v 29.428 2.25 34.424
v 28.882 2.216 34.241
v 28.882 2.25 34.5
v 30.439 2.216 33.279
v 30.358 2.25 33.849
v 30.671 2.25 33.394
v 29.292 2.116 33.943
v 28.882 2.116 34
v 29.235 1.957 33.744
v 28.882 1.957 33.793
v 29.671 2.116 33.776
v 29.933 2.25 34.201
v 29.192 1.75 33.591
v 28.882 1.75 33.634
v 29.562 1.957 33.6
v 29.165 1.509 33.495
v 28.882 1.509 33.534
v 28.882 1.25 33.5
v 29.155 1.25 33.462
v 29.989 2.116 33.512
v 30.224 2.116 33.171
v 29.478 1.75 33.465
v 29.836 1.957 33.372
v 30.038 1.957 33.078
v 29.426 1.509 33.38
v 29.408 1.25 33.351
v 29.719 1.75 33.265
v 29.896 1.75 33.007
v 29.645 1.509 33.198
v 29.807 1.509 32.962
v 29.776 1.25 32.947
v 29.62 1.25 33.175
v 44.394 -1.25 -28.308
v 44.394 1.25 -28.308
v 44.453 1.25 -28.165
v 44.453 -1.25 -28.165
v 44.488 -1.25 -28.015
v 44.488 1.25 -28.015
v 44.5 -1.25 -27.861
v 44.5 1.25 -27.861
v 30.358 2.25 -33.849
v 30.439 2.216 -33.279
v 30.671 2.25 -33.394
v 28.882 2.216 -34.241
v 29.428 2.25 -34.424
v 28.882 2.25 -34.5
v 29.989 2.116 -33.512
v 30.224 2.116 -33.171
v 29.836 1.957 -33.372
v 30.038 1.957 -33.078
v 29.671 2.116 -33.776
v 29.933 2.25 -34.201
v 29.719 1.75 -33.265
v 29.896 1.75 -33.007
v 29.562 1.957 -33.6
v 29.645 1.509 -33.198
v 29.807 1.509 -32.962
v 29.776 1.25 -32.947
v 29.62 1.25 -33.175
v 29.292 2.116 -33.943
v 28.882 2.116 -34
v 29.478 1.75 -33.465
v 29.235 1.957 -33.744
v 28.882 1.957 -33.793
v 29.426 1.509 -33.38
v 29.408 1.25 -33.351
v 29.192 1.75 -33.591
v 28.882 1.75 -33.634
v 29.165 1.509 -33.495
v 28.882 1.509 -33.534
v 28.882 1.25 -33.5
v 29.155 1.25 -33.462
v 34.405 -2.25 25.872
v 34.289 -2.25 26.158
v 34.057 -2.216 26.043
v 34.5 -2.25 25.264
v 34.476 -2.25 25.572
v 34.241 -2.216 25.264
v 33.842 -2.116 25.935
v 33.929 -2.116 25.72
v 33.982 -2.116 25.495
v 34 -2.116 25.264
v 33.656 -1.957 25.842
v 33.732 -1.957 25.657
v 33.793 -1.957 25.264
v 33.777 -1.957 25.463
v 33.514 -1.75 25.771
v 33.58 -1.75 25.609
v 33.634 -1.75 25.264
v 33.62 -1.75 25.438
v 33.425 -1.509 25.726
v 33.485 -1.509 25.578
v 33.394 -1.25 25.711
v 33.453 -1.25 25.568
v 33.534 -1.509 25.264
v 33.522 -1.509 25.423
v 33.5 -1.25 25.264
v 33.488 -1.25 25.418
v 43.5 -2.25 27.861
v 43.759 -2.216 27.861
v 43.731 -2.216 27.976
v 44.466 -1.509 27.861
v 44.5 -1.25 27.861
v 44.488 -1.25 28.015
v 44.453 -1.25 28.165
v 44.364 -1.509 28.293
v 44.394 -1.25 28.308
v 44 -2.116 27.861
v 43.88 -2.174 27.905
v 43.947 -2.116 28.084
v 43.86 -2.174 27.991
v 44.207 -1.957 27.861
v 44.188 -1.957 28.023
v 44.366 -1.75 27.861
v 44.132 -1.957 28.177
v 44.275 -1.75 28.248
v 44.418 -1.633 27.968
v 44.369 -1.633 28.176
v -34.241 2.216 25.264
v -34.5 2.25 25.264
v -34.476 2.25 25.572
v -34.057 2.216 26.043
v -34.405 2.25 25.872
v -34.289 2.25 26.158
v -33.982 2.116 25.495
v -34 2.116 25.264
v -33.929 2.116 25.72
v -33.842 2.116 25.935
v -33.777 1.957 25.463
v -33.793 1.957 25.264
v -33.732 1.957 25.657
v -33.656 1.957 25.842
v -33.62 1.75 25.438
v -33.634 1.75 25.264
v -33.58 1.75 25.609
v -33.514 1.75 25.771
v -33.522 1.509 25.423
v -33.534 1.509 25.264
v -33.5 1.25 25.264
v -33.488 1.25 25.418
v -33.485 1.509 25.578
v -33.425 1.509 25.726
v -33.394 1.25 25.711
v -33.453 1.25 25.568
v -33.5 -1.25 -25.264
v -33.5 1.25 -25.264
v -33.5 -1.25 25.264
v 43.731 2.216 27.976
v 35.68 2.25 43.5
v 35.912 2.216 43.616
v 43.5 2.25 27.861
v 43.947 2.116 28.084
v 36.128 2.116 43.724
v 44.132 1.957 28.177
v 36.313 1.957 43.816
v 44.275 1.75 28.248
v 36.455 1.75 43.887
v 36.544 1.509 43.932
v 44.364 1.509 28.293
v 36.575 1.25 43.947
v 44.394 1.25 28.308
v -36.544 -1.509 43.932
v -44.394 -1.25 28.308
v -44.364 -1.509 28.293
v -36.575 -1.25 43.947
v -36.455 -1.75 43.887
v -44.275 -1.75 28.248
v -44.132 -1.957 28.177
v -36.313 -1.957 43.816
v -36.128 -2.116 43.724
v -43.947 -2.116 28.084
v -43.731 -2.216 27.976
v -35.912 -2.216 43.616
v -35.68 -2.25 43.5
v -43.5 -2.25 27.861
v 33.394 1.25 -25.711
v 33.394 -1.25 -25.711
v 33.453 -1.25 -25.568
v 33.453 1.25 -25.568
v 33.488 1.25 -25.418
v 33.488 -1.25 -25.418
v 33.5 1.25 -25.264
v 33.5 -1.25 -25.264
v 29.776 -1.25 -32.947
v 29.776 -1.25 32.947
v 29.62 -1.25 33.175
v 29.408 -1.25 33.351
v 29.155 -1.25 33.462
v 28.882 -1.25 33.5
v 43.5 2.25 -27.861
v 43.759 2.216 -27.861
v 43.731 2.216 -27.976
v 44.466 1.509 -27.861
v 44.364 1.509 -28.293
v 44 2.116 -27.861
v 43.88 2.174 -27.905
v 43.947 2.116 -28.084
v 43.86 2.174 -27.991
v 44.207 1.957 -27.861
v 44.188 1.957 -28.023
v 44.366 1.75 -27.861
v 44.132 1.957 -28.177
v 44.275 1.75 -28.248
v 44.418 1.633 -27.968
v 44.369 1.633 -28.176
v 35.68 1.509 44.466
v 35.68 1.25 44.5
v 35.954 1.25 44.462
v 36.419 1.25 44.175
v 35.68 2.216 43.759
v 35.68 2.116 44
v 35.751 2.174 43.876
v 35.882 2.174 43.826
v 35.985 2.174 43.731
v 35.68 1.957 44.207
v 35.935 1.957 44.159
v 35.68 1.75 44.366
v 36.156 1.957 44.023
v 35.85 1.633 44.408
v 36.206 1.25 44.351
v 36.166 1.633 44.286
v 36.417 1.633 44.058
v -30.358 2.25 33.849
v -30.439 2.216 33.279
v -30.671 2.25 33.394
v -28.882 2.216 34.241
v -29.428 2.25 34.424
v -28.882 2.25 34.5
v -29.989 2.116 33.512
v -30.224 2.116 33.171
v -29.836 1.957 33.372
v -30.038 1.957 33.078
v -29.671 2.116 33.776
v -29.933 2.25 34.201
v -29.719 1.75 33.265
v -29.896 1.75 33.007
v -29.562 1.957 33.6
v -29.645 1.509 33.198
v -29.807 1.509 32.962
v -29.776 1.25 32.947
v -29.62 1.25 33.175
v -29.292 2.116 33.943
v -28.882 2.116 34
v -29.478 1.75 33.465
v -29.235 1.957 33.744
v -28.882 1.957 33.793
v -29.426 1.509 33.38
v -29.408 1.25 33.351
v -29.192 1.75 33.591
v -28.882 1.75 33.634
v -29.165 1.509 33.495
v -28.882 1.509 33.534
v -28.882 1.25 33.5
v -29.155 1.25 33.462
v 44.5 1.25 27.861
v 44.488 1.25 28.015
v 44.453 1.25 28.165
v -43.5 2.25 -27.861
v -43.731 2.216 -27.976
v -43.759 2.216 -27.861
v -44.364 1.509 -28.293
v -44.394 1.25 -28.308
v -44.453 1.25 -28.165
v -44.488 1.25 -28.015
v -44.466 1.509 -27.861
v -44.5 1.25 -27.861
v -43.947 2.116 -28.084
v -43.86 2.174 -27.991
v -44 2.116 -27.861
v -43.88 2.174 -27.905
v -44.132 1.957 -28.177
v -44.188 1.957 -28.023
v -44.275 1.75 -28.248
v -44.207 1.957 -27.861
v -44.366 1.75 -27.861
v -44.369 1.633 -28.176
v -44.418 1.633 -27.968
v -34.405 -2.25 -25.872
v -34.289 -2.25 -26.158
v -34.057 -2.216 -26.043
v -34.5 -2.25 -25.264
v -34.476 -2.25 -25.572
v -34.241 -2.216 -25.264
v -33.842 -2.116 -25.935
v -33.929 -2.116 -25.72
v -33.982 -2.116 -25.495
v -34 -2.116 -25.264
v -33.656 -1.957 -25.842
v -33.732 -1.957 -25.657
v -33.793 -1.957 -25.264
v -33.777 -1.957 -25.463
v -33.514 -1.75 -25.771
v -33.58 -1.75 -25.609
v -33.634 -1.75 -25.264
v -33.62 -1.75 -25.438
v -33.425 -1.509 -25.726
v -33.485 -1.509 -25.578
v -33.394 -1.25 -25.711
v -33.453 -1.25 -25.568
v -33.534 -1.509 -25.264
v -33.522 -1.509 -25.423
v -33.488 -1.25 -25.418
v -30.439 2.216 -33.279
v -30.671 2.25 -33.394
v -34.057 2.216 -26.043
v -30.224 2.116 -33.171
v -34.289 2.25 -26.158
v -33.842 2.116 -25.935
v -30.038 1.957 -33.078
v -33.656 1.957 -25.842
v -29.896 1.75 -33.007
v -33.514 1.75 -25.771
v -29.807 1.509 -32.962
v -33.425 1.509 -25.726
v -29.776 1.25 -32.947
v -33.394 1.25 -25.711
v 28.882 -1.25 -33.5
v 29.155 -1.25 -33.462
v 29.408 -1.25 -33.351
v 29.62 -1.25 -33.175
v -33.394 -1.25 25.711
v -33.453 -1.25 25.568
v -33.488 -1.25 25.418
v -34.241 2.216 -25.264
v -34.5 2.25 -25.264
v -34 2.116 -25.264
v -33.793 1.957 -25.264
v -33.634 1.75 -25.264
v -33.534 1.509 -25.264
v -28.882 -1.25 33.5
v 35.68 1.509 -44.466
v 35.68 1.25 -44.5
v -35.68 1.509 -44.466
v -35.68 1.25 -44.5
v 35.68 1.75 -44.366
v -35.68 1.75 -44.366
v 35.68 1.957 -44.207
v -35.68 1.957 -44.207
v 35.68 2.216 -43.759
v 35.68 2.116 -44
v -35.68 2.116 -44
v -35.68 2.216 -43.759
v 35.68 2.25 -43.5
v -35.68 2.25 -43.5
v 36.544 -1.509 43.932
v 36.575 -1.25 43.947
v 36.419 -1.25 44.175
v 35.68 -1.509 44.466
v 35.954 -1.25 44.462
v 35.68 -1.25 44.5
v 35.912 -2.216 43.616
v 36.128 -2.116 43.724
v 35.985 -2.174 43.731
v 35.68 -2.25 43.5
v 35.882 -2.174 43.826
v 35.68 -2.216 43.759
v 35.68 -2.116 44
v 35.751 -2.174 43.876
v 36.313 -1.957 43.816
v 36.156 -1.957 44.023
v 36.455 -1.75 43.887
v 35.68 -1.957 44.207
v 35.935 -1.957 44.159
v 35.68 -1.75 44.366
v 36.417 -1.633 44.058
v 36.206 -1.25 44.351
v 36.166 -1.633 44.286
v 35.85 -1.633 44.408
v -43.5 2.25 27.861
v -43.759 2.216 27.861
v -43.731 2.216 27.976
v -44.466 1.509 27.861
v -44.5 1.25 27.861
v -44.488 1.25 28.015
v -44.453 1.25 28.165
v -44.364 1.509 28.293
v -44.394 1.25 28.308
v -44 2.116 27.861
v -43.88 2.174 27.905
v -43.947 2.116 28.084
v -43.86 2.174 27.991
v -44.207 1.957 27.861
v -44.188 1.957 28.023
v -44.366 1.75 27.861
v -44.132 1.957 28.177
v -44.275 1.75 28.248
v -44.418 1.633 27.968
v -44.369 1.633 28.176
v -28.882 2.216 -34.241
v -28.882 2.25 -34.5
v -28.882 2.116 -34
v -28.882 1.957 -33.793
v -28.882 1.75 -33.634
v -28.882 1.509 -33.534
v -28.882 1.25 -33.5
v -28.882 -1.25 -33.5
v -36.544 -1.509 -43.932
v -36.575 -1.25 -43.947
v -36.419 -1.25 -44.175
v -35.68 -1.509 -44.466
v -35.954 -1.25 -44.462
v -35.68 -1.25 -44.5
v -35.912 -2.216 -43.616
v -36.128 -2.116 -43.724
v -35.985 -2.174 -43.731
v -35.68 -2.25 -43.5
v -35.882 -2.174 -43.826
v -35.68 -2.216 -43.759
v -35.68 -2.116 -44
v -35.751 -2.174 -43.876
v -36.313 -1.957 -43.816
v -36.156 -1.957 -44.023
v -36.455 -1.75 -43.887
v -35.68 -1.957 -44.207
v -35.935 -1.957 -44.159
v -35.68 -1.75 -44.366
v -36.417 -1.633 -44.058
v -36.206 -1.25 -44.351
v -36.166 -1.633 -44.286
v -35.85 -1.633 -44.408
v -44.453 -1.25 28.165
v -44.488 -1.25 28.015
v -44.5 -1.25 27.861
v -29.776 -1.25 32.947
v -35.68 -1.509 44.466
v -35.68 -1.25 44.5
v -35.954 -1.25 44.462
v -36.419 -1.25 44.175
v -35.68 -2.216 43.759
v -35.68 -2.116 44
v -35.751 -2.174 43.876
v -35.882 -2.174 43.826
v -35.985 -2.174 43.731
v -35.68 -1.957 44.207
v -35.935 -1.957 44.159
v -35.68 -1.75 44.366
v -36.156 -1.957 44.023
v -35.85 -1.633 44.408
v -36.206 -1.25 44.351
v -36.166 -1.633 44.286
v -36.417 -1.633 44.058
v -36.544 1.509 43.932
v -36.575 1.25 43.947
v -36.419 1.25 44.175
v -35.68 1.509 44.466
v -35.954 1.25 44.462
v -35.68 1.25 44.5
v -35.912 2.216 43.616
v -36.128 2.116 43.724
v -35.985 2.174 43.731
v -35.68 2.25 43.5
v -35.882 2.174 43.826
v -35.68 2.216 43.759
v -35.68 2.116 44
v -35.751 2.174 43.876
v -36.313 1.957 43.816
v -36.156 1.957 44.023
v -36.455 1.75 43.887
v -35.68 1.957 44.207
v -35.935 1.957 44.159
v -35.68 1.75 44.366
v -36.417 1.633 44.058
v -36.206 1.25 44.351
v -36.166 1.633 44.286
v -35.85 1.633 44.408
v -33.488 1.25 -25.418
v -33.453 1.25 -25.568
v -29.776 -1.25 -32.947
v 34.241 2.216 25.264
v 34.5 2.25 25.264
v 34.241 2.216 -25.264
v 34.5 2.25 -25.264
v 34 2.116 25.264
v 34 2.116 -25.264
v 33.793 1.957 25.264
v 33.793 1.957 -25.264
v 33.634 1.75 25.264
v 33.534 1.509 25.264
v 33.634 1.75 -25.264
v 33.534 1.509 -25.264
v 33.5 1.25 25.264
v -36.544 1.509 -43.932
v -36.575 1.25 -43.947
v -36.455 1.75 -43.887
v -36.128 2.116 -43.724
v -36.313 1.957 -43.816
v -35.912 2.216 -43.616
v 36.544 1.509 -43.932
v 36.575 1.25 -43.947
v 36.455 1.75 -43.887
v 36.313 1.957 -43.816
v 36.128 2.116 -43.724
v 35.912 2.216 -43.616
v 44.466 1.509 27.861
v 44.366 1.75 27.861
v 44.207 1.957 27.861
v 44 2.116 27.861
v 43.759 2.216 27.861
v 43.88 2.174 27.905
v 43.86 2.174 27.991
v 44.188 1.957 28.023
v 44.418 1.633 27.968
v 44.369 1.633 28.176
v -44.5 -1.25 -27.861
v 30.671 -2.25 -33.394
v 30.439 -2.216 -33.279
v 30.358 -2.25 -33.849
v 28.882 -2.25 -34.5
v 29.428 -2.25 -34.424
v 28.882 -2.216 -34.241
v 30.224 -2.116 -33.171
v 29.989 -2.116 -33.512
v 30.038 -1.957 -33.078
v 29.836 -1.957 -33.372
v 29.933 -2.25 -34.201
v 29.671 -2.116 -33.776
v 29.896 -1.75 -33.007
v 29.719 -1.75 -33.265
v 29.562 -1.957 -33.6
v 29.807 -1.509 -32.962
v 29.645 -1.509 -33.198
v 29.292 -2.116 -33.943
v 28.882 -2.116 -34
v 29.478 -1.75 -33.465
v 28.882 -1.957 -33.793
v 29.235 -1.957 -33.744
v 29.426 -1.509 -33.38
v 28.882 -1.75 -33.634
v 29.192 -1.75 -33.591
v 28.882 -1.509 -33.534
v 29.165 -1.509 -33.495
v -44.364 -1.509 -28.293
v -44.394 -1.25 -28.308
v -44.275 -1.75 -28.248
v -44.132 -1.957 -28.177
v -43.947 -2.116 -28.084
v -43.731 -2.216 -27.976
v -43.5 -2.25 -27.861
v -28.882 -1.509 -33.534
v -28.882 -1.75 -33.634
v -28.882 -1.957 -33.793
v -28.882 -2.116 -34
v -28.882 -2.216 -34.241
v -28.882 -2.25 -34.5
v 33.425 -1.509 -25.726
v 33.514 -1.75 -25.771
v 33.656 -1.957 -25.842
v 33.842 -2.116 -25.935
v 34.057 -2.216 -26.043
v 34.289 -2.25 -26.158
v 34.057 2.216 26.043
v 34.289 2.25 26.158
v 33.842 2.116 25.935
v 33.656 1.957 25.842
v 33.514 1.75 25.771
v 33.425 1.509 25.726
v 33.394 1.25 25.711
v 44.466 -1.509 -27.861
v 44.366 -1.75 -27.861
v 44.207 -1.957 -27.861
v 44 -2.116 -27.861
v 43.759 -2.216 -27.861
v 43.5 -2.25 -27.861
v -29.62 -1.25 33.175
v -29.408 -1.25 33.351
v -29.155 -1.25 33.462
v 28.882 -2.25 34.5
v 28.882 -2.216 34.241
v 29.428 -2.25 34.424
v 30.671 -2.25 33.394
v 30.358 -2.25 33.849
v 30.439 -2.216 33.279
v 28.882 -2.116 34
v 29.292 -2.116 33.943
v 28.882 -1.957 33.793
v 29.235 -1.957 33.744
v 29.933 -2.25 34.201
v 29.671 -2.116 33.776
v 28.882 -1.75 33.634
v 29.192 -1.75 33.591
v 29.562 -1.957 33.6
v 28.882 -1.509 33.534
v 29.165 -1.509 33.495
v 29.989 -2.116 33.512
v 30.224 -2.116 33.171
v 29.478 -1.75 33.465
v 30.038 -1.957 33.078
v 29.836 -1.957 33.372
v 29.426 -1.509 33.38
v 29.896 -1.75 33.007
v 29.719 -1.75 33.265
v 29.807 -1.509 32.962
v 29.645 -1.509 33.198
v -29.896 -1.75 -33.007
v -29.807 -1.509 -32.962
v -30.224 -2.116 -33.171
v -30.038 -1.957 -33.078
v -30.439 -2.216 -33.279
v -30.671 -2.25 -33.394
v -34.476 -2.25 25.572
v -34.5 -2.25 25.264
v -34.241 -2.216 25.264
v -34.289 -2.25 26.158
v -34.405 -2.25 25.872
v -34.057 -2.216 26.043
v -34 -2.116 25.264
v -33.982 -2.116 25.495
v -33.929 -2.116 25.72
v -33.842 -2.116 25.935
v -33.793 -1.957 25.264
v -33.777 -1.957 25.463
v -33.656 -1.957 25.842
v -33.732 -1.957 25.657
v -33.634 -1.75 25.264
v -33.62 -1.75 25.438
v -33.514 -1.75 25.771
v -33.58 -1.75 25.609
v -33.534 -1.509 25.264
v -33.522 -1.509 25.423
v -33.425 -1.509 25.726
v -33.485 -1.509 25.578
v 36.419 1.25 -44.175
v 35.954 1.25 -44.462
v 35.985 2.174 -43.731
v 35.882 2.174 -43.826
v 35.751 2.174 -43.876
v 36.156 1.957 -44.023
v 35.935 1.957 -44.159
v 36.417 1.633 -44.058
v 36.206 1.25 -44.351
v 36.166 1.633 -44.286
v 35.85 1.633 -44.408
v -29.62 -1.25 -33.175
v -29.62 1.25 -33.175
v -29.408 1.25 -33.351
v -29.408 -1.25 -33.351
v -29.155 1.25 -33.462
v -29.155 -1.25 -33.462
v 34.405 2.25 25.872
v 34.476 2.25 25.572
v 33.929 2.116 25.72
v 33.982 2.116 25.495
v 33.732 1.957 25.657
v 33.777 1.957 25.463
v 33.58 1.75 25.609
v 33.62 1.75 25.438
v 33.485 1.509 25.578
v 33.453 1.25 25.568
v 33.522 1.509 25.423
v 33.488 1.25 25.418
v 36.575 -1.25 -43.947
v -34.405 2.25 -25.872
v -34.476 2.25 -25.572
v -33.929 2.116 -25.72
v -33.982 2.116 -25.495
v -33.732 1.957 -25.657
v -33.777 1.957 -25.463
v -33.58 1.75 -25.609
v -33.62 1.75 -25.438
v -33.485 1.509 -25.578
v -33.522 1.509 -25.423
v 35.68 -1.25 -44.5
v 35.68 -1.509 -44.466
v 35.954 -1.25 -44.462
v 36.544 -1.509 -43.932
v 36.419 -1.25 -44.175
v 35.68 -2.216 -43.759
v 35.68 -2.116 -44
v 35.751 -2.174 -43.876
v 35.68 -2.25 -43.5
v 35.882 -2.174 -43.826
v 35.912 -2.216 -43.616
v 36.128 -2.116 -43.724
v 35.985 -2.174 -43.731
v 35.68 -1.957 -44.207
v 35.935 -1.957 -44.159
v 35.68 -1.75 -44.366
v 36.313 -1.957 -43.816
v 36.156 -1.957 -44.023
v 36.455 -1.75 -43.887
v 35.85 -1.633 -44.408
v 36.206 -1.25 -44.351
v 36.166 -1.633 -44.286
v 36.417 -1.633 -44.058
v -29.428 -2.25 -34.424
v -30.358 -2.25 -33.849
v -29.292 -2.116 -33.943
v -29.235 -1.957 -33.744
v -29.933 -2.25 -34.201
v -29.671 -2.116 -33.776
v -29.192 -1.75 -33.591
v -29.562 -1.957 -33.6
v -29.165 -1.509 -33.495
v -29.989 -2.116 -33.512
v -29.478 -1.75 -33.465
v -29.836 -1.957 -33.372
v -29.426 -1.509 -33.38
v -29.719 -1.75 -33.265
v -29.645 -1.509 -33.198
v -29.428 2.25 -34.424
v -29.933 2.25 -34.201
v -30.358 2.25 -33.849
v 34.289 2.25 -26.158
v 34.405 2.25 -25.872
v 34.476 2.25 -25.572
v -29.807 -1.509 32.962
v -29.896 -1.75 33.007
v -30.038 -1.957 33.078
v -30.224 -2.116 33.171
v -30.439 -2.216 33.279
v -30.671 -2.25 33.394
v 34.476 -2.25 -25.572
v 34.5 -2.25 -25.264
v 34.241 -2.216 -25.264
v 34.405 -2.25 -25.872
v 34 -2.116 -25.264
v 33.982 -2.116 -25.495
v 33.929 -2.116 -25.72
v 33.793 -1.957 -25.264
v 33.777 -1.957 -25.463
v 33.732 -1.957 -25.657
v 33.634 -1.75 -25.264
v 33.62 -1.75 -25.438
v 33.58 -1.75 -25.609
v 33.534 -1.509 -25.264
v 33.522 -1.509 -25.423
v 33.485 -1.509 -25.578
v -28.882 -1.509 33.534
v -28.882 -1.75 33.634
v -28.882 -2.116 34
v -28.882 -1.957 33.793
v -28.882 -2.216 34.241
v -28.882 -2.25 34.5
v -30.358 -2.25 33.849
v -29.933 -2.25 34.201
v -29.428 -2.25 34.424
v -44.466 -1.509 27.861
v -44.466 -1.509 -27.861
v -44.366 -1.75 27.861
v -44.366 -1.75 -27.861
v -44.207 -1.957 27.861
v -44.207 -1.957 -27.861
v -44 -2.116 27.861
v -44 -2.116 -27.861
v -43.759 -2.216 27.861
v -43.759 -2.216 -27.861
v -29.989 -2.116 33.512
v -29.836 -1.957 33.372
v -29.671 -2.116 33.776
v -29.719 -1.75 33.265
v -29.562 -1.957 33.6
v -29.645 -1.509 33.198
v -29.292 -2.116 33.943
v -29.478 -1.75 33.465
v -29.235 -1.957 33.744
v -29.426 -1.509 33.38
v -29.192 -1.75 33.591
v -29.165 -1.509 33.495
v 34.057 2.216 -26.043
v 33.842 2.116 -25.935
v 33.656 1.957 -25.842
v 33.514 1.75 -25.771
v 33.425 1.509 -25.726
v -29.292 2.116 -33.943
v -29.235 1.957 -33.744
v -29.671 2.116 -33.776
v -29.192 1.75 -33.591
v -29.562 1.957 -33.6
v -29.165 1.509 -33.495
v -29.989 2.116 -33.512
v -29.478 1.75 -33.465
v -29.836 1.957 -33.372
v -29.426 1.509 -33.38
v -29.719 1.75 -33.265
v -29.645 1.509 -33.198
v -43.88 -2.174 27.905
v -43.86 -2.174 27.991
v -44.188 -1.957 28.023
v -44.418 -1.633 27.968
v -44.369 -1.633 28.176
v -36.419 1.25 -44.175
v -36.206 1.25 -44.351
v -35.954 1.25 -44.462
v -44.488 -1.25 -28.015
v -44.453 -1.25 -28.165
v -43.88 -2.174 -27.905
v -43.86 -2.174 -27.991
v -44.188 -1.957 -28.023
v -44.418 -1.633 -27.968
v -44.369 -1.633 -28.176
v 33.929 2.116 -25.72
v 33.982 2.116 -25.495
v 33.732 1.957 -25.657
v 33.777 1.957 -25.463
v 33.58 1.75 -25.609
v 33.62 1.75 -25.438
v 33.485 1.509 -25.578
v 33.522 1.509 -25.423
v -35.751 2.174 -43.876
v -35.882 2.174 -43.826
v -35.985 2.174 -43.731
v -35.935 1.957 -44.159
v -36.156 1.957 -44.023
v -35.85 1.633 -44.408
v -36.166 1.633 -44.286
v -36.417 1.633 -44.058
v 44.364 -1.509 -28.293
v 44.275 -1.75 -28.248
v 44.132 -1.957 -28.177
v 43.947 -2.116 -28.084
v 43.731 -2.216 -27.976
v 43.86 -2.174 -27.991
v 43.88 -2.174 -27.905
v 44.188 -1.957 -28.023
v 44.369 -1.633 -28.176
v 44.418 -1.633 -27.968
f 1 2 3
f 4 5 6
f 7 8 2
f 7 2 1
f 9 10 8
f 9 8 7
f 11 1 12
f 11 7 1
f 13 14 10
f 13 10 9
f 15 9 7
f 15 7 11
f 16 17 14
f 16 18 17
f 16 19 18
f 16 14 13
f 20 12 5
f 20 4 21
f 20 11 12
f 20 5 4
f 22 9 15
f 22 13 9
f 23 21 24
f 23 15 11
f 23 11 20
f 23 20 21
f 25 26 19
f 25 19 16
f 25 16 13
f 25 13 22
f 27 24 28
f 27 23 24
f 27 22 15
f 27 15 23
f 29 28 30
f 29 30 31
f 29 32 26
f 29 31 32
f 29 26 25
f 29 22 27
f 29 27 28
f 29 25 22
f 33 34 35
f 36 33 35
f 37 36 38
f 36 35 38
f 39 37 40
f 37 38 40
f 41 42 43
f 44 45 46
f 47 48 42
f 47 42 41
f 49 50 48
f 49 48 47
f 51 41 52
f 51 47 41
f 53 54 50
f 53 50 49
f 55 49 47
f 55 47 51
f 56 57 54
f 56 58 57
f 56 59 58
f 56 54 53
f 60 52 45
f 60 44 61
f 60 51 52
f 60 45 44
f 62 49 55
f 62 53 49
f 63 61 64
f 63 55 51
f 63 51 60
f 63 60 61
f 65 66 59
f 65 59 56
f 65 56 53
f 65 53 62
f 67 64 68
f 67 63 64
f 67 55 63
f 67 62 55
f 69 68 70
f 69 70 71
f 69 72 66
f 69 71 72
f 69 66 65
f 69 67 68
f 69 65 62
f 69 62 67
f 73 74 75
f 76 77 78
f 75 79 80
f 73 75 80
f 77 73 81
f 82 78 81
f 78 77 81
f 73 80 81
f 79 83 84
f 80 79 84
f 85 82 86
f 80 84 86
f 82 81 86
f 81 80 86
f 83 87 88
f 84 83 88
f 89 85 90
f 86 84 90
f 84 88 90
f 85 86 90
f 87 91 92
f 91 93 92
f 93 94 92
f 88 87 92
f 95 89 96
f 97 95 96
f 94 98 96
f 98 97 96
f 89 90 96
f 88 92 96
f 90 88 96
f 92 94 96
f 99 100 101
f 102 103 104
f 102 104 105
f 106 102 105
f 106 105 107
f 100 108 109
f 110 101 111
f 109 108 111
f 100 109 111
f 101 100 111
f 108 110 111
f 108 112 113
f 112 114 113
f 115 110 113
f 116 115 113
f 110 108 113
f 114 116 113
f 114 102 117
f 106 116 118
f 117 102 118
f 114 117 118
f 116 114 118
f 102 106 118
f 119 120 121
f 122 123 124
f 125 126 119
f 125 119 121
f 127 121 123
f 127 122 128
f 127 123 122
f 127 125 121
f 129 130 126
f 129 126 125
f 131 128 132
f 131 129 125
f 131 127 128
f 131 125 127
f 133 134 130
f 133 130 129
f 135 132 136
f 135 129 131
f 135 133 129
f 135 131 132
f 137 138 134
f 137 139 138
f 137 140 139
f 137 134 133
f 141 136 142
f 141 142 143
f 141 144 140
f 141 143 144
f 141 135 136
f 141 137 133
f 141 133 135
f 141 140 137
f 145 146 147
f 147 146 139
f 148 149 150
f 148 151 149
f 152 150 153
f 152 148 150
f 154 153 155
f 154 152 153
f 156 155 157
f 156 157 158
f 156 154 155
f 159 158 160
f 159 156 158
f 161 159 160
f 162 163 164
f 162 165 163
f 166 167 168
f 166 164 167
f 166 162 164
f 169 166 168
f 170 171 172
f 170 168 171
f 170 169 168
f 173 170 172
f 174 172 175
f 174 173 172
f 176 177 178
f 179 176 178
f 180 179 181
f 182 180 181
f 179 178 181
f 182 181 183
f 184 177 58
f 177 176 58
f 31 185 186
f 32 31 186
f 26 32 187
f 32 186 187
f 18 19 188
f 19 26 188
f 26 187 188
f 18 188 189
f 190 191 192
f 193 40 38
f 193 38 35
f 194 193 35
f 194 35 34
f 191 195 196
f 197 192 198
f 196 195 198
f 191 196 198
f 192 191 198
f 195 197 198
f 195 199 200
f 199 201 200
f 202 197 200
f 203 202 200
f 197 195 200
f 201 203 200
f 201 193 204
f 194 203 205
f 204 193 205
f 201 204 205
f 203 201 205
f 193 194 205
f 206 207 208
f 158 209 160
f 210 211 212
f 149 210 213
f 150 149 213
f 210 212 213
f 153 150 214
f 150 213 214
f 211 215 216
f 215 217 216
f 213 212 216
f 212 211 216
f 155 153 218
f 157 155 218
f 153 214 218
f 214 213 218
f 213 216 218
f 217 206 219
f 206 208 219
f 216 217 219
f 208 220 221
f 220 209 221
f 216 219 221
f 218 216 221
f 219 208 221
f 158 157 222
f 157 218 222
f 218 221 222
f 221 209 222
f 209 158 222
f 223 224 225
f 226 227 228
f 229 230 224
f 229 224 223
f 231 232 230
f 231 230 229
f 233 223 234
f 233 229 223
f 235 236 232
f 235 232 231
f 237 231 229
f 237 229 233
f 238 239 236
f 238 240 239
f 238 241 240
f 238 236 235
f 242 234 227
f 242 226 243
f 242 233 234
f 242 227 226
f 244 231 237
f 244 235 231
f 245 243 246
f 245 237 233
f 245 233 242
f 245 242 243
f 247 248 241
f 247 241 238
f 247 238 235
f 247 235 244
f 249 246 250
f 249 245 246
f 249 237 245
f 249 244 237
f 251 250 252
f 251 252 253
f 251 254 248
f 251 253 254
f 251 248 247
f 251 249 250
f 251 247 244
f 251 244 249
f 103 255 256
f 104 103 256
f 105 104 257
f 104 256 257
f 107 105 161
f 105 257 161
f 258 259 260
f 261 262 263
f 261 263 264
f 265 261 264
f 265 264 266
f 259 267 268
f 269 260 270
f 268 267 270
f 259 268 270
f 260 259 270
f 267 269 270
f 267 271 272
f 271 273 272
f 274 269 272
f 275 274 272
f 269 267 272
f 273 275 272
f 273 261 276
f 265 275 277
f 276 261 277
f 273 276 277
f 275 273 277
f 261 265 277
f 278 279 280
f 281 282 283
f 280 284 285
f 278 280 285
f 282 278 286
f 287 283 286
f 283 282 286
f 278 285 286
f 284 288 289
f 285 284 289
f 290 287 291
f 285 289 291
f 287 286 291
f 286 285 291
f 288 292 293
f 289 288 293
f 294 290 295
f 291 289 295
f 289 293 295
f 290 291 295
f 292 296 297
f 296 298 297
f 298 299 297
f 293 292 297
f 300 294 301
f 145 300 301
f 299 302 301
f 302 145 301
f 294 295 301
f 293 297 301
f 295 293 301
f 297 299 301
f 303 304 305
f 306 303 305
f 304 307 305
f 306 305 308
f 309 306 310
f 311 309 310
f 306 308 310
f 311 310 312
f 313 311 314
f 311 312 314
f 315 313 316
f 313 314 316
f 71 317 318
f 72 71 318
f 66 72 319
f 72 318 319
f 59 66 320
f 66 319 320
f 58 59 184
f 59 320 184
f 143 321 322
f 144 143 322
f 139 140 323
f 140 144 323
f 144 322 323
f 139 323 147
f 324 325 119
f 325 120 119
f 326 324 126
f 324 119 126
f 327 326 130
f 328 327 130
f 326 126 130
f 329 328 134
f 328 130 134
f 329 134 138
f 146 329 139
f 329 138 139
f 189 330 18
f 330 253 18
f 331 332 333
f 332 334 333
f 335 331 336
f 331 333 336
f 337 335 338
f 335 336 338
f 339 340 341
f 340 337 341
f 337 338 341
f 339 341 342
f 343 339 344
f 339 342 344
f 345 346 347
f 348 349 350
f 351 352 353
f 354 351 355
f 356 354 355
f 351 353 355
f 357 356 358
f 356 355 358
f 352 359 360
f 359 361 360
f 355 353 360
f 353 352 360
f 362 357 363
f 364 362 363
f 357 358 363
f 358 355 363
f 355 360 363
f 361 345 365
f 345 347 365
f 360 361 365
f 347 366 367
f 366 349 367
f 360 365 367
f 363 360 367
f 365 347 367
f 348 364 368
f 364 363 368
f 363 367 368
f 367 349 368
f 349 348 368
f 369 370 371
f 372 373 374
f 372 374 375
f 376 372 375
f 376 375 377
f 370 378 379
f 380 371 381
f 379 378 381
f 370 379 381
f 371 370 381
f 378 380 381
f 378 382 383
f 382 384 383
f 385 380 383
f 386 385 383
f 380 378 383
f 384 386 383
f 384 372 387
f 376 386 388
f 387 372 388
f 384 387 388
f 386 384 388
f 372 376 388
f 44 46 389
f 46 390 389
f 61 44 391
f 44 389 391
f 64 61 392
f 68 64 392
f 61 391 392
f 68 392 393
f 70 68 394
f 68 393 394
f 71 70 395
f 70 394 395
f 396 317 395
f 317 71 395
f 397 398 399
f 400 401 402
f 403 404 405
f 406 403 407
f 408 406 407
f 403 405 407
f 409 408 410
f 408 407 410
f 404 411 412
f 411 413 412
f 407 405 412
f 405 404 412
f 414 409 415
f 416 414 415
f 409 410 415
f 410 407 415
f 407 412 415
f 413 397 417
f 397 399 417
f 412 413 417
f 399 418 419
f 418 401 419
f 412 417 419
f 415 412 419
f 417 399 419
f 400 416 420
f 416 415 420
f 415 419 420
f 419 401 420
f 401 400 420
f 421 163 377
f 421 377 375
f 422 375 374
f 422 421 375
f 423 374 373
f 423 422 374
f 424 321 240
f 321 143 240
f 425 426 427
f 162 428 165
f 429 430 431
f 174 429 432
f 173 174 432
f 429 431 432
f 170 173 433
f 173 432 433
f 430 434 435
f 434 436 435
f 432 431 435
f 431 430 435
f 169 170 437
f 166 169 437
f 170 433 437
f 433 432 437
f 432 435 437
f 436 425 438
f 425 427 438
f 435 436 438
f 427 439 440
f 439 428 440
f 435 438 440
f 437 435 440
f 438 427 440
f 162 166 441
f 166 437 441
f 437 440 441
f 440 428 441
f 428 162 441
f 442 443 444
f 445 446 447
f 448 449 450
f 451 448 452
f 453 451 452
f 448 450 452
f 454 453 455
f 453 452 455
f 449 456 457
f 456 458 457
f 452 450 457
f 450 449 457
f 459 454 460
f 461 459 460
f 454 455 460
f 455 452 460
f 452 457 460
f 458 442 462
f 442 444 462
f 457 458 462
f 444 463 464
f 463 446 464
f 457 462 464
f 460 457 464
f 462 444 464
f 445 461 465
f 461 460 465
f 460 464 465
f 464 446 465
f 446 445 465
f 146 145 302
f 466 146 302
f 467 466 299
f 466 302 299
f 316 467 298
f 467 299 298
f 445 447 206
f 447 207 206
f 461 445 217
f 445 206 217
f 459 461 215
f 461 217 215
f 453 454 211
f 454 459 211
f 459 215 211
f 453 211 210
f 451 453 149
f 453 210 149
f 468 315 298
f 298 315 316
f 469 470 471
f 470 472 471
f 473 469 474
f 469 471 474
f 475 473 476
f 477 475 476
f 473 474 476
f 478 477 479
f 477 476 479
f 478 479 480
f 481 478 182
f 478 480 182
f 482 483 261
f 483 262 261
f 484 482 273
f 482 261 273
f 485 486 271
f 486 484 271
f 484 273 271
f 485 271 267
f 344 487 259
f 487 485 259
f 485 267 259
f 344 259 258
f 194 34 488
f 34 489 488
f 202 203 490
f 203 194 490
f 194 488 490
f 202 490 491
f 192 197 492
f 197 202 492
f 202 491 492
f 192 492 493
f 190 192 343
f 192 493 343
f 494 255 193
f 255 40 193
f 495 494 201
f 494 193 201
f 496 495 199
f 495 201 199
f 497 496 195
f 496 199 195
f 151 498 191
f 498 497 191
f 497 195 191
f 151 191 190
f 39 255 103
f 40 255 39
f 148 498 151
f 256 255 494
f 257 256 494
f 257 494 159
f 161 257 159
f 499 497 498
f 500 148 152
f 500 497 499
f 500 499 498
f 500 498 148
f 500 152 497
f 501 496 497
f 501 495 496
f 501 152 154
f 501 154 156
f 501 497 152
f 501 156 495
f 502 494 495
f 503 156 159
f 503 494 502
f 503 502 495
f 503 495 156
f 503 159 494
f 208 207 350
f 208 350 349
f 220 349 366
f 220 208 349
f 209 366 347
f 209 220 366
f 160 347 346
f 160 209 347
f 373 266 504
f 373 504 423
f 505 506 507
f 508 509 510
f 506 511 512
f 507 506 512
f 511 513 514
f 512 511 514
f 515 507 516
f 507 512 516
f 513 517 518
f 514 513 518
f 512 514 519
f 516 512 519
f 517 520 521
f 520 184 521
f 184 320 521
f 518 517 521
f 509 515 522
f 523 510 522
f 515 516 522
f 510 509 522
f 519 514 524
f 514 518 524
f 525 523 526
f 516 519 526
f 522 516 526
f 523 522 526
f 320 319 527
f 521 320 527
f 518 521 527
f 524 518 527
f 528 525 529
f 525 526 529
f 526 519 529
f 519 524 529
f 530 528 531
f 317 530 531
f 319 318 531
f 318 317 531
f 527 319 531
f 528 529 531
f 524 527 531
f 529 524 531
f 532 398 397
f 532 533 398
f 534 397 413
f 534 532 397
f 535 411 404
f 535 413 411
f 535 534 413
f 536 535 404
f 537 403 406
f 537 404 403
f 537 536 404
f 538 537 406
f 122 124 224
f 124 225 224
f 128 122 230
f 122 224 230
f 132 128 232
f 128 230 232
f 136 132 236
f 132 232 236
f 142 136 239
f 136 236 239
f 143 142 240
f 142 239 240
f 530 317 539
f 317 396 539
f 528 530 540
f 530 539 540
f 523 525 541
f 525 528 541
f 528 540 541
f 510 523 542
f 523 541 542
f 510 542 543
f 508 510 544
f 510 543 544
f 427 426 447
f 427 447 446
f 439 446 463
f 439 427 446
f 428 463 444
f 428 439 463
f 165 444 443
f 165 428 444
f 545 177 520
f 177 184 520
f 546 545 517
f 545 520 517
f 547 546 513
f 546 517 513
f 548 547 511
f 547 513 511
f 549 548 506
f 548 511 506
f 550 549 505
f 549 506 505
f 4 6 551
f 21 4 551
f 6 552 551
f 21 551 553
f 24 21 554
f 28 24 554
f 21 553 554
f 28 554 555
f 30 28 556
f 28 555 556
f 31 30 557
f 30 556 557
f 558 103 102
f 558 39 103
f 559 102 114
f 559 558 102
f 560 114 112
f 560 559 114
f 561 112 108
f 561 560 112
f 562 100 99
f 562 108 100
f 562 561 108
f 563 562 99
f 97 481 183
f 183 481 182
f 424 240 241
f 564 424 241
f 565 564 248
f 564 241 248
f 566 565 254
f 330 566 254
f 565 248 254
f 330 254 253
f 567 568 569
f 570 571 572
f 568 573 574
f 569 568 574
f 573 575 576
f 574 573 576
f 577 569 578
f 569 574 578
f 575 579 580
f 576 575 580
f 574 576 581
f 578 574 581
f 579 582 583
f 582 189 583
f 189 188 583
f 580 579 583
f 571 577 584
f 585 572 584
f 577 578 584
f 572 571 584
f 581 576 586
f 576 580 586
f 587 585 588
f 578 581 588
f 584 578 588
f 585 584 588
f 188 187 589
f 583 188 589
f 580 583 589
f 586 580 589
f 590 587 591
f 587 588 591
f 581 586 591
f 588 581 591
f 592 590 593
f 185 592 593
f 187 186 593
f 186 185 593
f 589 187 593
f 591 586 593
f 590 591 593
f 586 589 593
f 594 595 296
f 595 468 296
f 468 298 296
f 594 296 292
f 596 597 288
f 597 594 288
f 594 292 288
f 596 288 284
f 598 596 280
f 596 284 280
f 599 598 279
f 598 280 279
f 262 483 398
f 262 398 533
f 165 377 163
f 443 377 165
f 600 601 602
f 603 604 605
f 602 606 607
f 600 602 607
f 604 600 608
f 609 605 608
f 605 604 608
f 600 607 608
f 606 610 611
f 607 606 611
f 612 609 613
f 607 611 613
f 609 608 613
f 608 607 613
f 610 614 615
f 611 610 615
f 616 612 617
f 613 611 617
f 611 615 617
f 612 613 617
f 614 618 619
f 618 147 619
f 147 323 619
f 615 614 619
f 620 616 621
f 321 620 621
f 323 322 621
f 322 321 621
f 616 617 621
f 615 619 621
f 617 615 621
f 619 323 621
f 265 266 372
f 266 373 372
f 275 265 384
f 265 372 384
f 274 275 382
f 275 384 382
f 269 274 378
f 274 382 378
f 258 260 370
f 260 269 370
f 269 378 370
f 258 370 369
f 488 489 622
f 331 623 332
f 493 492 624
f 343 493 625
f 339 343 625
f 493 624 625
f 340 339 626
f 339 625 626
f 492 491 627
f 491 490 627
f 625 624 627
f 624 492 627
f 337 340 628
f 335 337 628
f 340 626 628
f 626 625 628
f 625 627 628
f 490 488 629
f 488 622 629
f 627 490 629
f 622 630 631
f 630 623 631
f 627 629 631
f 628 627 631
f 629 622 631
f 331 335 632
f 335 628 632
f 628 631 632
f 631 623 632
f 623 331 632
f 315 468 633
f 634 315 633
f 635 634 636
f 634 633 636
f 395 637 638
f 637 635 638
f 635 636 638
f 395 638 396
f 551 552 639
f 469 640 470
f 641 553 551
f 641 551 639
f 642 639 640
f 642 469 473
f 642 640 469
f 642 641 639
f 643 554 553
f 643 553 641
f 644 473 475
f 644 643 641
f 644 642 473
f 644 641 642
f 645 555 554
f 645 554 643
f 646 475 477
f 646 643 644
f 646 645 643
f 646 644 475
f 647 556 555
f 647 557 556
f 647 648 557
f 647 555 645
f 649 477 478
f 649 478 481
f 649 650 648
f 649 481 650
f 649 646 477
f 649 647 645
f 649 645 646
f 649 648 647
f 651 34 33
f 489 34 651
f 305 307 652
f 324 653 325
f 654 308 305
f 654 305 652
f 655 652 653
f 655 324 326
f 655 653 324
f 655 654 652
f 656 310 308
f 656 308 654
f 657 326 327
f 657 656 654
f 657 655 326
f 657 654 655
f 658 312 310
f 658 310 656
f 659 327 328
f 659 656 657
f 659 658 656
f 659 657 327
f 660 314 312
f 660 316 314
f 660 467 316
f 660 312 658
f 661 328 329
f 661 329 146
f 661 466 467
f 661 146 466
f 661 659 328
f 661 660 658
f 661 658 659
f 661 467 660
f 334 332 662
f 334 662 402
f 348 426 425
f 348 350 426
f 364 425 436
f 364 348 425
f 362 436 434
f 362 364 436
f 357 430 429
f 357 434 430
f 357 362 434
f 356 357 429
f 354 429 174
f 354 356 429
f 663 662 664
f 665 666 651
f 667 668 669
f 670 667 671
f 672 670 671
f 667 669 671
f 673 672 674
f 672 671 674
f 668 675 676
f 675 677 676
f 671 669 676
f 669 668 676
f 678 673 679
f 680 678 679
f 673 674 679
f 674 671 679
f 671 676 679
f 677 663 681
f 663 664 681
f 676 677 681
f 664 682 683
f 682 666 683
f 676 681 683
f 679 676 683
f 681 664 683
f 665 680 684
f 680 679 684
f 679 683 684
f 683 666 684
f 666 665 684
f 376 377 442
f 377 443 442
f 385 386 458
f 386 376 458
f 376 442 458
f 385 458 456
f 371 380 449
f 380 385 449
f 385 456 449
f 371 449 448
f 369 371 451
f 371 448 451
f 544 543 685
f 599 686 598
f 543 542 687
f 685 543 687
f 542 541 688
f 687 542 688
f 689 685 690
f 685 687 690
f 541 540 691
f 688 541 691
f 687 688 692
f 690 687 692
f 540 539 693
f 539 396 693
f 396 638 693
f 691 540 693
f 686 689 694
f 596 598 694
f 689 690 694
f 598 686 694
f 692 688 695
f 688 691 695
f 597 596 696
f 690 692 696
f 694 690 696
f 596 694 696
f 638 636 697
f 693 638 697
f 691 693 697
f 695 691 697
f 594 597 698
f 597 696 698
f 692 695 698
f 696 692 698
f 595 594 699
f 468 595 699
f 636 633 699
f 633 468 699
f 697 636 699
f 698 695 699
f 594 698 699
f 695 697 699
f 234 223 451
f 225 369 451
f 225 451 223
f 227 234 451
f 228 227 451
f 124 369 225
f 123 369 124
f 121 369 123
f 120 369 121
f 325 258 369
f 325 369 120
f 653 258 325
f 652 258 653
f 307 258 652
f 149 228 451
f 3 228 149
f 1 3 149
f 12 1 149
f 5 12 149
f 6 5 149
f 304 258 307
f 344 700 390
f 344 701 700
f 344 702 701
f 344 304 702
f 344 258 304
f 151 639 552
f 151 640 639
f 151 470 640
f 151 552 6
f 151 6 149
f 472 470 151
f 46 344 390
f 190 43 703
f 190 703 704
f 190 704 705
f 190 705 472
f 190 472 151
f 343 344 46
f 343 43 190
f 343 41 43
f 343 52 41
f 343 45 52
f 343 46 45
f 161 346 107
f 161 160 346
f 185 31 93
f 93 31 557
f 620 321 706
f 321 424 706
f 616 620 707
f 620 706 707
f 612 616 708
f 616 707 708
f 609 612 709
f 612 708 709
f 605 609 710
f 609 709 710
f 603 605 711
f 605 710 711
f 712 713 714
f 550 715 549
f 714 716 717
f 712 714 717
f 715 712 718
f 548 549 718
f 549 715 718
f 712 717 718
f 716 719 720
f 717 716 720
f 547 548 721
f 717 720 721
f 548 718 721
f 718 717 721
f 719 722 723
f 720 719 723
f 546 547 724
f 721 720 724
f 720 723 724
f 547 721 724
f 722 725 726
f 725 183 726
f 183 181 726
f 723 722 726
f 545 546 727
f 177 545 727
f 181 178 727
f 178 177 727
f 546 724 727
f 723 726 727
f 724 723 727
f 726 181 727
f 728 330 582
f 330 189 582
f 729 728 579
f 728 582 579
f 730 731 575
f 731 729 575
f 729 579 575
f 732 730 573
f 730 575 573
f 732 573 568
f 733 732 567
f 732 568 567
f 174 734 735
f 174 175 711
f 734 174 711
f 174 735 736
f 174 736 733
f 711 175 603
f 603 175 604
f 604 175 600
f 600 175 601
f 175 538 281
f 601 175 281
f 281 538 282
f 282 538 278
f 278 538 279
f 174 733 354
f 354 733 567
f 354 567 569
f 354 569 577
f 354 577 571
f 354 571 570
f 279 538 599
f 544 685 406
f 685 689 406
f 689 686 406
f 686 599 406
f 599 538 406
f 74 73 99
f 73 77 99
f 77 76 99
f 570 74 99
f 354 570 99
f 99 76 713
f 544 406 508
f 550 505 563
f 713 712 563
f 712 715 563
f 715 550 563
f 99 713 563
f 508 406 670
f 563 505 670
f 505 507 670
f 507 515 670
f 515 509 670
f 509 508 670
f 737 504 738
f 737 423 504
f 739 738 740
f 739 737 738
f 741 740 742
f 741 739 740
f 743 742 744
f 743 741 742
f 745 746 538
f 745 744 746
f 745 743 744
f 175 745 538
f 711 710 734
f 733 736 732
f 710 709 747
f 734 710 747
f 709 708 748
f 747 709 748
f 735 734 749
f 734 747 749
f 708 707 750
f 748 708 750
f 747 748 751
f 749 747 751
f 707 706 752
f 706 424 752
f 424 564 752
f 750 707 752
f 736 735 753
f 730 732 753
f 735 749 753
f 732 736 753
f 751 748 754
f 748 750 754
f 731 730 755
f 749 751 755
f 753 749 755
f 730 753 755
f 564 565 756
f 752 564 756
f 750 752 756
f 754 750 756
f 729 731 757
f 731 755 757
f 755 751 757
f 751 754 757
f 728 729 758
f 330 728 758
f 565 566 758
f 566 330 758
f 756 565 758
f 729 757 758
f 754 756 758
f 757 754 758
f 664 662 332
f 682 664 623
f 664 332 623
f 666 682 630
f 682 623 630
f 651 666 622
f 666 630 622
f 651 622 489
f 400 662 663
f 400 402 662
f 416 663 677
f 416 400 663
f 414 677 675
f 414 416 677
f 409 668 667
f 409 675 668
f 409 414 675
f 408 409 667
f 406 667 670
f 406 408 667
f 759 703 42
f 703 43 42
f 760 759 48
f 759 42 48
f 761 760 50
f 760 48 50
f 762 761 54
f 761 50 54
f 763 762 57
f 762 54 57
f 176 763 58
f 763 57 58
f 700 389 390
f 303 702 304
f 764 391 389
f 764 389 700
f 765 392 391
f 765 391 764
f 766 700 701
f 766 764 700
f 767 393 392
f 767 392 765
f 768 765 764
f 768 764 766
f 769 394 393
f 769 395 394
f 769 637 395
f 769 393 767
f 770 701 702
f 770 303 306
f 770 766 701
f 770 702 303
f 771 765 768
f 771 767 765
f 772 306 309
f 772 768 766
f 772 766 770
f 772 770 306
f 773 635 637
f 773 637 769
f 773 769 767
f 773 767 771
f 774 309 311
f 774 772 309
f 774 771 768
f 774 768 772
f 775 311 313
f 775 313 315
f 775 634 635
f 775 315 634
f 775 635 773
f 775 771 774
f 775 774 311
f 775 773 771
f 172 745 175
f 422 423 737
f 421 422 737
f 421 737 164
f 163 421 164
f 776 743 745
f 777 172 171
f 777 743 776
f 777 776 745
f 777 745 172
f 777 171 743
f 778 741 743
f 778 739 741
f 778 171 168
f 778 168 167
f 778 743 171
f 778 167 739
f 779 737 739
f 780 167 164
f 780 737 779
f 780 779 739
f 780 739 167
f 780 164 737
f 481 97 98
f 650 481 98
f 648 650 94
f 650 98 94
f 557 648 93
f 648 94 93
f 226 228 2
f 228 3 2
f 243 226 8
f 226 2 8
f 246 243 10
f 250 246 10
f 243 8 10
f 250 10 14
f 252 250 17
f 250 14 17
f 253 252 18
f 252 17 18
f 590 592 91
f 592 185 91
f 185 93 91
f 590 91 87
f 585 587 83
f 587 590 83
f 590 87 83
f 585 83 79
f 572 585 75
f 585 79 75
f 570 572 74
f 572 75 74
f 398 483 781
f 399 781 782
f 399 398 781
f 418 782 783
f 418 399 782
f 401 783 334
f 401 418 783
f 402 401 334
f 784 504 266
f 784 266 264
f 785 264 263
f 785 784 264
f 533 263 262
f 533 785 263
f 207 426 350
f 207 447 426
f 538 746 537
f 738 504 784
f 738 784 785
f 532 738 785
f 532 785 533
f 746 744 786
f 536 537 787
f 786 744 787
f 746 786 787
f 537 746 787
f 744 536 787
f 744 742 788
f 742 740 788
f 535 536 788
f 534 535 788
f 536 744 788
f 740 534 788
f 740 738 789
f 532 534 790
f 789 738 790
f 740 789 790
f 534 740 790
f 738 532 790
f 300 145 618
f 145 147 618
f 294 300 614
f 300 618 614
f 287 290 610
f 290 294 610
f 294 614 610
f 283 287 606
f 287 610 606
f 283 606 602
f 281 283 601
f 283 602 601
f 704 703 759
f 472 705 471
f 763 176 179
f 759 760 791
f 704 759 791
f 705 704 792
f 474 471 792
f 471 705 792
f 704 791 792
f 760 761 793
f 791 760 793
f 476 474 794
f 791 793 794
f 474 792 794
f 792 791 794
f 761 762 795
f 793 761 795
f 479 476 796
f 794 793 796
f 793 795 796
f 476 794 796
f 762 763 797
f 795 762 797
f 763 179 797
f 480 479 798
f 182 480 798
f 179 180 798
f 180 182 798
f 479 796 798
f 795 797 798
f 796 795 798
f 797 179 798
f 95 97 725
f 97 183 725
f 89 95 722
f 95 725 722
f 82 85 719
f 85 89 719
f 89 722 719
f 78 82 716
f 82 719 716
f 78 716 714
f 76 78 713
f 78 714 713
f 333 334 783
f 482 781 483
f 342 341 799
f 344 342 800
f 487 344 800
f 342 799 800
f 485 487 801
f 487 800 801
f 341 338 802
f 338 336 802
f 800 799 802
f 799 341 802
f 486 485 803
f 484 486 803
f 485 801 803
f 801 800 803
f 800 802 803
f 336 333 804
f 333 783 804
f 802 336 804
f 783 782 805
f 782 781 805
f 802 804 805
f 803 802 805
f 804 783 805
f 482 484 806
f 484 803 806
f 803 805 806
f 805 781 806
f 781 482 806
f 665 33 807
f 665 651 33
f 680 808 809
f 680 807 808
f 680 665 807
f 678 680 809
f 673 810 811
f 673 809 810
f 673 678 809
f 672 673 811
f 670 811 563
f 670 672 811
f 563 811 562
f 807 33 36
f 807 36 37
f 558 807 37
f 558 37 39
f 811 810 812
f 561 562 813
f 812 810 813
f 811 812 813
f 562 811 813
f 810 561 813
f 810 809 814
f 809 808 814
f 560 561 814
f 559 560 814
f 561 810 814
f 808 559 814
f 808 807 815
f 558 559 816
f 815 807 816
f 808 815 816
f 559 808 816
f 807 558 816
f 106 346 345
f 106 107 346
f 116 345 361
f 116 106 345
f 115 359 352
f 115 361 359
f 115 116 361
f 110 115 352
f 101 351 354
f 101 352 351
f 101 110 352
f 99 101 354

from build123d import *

# Parameters (mm, degrees)
BOSS_EXTRUDE1_DEPTH = 2.25
FILLET1_R           = 1


with BuildPart() as part:
    # Sketch1 → Boss-Extrude1 (new, symmetric)
    with BuildSketch(Plane(origin=(0, 0, 0), x_dir=(1, 0, 0), z_dir=(0, 1, 0))):
        Polygon((-36.298373876, -44.5), (36.298373876, -44.5), (44.5, -28.096747752), (44.5, 28.096747752), (36.298373876, 44.5), (-36.298373876, 44.5), (-44.5, 28.096747752), (-44.5, -28.096747752), align=None)
        Polygon((-29.5, -33.5), (29.5, -33.5), (33.5, -25.5), (33.5, 25.5), (29.5, 33.5), (-29.5, 33.5), (-33.5, 25.5), (-33.5, -25.5), align=None, mode=Mode.SUBTRACT)
    extrude(amount=BOSS_EXTRUDE1_DEPTH, both=True)

    # Fillet1
    fillet1_edges = [part.edges().sort_by_distance(p)[0] for p in [
        (44.5, -2.25, 0),
        (40.399186938, -2.25, 36.298373876),
        (0, -2.25, 44.5),
        (-40.399186938, -2.25, 36.298373876),
        (40.399186938, 2.25, 36.298373876),
        (-44.5, 0, 28.096747752),
        (-44.5, 0, -28.096747752),
        (-36.298373876, 0, -44.5),
        (36.298373876, 0, -44.5),
        (44.5, 0, -28.096747752),
        (44.5, 0, 28.096747752),
        (36.298373876, 0, 44.5),
        (-36.298373876, 0, 44.5),
        (44.5, 2.25, 0),
        (40.399186938, 2.25, -36.298373876),
        (0, 2.25, -44.5),
        (31.5, -2.25, -29.5),
        (33.5, 0, -25.5),
        (0, -2.25, -33.5),
        (29.5, 0, -33.5),
        (-31.5, -2.25, -29.5),
        (-29.5, 0, -33.5),
        (-33.5, -2.25, 0),
        (-40.399186938, 2.25, -36.298373876),
        (-33.5, 0, -25.5),
        (-31.5, -2.25, 29.5),
        (-33.5, 0, 25.5),
        (0, -2.25, 33.5),
        (-29.5, 0, 33.5),
        (31.5, -2.25, 29.5),
        (29.5, 0, 33.5),
        (33.5, -2.25, 0),
        (33.5, 0, 25.5),
        (31.5, 2.25, -29.5),
        (0, 2.25, -33.5),
        (-31.5, 2.25, -29.5),
        (-33.5, 2.25, 0),
        (-31.5, 2.25, 29.5),
        (0, 2.25, 33.5),
        (31.5, 2.25, 29.5),
        (-44.5, 2.25, 0),
        (33.5, 2.25, 0),
        (-40.399186938, 2.25, 36.298373876),
        (-44.5, -2.25, 0),
        (0, 2.25, 44.5),
        (-40.399186938, -2.25, -36.298373876),
        (0, -2.25, -44.5),
        (40.399186938, -2.25, -36.298373876),
    ]]
    fillet(fillet1_edges, radius=FILLET1_R)


solid = part.part
